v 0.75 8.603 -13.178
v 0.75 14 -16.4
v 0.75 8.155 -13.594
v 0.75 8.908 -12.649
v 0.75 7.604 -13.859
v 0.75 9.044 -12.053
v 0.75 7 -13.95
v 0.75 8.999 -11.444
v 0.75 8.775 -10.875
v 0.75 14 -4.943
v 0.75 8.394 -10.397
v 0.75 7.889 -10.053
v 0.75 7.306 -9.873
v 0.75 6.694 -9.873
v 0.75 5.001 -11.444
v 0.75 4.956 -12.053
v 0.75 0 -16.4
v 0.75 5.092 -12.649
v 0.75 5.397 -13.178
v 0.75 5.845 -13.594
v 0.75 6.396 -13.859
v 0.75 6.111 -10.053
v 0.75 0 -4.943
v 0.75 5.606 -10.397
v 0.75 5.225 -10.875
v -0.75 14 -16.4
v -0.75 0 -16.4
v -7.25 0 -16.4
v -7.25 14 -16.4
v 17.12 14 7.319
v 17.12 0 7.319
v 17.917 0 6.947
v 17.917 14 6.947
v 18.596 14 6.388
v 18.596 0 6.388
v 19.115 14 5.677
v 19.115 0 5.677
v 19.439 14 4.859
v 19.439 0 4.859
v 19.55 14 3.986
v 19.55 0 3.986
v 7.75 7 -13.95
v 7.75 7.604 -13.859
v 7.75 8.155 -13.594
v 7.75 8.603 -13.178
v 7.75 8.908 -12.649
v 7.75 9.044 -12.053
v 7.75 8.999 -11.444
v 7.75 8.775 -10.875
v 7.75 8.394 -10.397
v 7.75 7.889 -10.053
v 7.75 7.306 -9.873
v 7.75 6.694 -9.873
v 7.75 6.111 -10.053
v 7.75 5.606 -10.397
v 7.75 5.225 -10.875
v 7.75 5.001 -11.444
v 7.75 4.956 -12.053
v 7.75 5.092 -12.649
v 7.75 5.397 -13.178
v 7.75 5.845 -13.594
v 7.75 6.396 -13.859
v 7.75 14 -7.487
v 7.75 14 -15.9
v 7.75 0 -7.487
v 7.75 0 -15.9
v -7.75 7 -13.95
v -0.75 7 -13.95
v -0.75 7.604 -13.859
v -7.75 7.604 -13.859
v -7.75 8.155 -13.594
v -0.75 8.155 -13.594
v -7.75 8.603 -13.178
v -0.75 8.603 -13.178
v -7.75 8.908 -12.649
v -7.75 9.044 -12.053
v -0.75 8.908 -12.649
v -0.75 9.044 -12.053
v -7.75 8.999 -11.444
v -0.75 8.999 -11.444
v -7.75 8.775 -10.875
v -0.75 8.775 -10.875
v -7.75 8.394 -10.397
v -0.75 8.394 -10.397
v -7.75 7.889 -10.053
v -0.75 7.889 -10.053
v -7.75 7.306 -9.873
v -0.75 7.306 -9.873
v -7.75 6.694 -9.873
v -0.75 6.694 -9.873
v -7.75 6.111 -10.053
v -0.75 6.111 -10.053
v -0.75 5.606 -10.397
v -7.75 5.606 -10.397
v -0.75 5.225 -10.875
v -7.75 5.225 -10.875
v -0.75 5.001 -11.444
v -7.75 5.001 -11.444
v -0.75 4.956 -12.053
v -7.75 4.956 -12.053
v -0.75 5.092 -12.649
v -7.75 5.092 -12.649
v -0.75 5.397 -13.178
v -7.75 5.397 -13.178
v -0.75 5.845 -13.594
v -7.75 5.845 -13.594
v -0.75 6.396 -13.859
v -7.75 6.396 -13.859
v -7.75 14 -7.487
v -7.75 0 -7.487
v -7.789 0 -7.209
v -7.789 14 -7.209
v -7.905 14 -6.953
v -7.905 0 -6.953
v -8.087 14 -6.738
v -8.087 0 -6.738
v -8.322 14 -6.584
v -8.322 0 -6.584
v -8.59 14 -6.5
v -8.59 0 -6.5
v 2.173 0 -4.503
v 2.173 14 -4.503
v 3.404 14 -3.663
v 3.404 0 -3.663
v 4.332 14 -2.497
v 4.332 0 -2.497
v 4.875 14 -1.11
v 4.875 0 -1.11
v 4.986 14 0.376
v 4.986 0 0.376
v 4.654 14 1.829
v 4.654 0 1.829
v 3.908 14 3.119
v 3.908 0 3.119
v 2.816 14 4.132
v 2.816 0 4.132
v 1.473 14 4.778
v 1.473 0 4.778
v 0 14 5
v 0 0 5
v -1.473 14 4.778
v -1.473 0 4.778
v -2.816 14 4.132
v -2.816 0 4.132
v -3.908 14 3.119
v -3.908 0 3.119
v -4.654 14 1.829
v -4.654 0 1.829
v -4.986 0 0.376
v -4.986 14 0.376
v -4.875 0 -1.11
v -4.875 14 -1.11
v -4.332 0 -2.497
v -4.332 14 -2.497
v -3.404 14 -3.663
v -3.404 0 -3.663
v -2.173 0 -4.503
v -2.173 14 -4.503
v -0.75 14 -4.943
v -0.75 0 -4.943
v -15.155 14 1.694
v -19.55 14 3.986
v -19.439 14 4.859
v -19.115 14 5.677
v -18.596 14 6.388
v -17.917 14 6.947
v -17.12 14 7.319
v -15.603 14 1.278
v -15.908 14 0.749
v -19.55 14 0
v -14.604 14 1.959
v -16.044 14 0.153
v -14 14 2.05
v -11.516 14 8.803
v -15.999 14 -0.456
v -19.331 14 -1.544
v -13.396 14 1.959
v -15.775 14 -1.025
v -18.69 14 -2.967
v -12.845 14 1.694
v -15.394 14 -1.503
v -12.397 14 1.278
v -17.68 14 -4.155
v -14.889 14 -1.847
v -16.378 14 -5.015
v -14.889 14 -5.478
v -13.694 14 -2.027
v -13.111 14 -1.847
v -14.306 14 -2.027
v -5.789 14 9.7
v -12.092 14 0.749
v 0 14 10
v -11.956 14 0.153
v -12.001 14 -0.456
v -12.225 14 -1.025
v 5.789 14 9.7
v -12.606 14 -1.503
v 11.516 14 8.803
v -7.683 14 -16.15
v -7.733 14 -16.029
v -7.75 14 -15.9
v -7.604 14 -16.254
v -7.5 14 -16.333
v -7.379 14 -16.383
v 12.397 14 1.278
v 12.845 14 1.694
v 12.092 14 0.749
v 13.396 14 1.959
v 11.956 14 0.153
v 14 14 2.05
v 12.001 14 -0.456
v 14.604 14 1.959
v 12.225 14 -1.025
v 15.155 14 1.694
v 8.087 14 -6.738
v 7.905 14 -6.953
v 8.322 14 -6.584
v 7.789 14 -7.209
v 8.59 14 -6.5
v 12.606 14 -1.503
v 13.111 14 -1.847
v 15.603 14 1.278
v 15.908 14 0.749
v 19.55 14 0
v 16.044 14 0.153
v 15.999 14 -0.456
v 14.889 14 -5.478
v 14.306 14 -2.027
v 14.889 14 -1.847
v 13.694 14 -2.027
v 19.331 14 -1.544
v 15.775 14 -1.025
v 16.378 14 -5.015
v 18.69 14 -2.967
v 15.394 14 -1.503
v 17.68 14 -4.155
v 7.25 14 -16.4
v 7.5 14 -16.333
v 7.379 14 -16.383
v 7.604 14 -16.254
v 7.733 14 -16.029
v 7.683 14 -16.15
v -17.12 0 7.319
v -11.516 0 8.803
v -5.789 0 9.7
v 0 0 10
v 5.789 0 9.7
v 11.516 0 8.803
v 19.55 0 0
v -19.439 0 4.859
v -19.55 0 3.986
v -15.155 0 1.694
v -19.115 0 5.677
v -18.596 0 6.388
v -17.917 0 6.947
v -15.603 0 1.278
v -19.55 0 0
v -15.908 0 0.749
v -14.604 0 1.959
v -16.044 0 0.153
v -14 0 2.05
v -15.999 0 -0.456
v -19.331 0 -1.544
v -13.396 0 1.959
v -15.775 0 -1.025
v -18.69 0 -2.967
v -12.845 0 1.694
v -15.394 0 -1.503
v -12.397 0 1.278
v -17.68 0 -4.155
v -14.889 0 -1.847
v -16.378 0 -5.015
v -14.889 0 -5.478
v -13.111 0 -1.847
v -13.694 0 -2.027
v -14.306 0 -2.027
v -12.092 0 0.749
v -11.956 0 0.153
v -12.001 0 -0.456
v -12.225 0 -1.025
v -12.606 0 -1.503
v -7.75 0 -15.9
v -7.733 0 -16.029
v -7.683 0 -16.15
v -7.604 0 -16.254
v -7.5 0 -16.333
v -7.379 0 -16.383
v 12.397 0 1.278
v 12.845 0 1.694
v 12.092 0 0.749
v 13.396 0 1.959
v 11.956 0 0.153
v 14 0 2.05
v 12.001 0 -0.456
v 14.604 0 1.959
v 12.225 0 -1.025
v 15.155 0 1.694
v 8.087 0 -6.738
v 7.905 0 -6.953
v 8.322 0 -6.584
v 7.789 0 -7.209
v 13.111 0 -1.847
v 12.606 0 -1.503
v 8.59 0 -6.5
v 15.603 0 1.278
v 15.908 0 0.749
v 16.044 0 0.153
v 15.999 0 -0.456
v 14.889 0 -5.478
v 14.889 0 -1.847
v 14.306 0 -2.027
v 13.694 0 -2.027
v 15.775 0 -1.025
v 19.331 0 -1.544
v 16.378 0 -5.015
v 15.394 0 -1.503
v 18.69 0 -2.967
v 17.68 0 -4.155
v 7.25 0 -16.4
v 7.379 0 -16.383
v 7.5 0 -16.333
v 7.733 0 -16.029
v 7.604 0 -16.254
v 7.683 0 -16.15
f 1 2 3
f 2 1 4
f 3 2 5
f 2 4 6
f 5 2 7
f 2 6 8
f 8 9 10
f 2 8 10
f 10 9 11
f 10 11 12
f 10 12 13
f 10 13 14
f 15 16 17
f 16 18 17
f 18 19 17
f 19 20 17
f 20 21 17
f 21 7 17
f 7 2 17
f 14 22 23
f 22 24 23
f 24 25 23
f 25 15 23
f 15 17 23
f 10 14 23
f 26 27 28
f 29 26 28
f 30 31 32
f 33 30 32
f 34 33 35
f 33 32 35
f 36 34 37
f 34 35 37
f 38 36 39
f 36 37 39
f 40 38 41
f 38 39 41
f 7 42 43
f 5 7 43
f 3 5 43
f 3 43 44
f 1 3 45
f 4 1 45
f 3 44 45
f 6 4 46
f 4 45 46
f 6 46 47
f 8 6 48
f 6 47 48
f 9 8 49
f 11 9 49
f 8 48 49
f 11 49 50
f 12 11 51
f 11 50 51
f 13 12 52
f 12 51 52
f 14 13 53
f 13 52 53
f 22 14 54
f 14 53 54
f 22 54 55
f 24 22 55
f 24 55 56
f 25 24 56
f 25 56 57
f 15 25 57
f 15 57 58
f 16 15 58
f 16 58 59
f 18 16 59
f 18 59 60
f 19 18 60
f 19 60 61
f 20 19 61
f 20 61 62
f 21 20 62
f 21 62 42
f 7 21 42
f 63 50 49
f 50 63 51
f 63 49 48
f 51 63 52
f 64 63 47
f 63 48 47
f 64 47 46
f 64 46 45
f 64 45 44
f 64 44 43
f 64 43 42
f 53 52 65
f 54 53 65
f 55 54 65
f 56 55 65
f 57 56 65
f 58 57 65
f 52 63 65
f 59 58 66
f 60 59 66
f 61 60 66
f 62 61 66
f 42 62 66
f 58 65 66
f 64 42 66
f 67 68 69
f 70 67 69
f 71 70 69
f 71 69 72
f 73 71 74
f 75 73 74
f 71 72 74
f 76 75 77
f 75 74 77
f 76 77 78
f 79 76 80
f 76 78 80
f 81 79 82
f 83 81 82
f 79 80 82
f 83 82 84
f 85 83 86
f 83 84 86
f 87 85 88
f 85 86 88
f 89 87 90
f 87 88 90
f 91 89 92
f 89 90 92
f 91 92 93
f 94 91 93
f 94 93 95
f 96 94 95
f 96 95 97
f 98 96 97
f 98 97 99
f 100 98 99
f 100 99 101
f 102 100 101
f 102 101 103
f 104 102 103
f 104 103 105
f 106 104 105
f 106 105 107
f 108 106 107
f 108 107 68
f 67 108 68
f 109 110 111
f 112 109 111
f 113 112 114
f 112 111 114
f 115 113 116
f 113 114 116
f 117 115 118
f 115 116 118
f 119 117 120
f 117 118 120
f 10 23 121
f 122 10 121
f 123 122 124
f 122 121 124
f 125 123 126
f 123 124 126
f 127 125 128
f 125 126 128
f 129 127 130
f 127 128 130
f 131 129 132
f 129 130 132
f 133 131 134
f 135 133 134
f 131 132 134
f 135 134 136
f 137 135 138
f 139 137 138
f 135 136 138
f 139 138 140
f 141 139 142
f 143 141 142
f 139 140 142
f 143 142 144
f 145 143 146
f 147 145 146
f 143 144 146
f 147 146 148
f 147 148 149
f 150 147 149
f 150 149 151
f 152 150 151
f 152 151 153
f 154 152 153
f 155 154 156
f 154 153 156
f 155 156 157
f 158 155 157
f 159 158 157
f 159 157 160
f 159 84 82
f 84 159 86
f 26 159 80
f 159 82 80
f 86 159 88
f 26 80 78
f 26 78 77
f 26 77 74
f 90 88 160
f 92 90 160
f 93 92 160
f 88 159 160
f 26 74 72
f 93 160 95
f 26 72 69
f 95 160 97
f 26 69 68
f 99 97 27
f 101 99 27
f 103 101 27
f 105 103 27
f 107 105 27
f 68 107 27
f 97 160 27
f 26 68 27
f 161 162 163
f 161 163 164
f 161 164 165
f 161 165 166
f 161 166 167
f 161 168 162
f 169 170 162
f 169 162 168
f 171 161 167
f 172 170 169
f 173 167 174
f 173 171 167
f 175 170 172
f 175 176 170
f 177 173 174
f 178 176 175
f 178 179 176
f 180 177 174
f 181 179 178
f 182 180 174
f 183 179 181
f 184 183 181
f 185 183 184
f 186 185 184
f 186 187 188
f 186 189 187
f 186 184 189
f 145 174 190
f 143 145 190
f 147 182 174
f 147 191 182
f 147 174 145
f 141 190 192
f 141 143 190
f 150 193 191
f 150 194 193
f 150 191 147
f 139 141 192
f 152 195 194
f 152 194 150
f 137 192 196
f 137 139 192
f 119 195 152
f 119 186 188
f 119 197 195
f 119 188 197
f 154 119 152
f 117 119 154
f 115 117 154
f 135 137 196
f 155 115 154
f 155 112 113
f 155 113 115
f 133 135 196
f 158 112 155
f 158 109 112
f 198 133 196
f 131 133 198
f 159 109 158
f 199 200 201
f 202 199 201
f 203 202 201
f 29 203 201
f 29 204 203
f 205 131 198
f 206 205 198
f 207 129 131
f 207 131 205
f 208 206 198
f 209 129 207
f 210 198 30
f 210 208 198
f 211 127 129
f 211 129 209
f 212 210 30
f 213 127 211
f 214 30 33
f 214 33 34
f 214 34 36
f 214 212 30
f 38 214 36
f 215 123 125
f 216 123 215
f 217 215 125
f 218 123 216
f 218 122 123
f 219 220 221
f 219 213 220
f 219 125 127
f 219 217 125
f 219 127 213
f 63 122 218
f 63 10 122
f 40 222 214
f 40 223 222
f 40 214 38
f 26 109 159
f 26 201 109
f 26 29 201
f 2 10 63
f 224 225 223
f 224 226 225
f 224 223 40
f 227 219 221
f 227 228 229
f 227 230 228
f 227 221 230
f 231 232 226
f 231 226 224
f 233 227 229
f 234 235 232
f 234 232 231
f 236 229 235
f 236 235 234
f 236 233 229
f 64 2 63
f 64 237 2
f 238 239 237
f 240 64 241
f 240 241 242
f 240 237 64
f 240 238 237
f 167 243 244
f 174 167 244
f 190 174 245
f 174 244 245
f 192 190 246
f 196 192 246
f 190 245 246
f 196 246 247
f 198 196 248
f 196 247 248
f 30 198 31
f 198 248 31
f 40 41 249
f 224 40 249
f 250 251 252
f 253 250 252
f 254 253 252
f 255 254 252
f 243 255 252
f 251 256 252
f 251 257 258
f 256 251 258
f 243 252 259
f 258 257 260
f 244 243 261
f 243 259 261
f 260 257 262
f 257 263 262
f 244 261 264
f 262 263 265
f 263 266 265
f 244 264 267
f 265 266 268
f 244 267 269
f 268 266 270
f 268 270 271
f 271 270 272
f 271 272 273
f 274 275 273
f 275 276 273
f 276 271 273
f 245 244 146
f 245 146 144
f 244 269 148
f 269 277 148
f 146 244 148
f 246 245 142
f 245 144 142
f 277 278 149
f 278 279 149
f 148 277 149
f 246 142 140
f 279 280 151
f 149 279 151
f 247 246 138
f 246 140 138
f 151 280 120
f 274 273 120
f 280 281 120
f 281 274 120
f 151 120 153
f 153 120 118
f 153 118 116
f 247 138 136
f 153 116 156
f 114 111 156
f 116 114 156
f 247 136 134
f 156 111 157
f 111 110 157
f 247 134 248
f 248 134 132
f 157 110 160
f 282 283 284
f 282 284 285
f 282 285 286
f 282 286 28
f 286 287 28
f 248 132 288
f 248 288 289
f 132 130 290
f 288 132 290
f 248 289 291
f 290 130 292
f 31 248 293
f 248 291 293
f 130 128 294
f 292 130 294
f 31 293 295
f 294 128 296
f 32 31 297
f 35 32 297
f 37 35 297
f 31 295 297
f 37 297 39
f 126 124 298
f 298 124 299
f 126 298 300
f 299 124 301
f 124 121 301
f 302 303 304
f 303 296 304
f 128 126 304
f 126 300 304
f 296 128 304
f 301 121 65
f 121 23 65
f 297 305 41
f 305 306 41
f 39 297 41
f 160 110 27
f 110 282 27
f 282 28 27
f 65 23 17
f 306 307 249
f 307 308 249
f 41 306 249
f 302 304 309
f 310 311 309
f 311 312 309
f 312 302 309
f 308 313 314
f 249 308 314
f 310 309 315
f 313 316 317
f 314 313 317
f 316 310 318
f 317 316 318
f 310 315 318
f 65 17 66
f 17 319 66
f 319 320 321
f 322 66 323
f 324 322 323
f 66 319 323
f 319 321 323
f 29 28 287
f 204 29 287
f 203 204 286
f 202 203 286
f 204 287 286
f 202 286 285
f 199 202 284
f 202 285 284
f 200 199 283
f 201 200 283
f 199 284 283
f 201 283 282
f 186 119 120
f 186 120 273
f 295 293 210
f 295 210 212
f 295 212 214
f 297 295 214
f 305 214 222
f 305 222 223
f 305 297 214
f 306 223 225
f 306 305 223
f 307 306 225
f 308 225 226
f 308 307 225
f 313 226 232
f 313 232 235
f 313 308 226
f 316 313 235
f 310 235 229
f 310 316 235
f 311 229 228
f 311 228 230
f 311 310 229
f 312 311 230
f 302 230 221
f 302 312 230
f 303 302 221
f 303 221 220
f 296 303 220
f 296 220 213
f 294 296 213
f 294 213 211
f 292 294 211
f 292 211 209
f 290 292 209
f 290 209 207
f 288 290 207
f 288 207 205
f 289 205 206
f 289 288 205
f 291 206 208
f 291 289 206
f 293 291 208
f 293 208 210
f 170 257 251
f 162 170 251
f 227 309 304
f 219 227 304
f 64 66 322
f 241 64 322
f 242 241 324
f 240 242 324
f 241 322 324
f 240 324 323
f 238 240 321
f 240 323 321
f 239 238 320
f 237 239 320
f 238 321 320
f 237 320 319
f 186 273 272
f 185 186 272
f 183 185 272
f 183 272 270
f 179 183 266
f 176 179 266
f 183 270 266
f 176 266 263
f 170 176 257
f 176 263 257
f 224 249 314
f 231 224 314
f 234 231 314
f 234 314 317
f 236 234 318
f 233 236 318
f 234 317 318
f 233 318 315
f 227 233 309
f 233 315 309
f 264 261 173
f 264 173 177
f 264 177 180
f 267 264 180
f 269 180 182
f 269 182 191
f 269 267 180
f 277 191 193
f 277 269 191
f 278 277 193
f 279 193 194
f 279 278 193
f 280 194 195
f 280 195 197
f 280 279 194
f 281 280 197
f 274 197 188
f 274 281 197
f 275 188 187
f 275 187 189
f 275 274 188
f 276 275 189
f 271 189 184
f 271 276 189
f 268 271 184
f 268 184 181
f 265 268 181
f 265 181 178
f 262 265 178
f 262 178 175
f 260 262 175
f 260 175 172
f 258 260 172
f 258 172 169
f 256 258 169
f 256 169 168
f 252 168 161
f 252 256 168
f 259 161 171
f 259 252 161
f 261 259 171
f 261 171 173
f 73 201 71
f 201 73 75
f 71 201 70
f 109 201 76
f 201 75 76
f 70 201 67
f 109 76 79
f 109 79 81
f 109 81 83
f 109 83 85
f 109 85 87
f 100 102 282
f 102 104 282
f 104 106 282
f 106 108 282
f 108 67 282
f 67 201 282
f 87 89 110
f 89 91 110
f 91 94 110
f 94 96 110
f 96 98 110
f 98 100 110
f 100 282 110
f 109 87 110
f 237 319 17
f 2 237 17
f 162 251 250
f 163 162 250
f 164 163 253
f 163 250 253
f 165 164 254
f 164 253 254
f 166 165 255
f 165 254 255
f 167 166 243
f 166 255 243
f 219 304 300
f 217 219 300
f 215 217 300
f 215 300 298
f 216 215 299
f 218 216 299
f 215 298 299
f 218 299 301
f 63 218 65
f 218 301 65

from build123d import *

# Parameters (mm, degrees)
SKETCH1_R           = 2.05
BOSS_EXTRUDE1_DEPTH = 14
SKETCH2_R           = 2.05
CUT_EXTRUDE1_DEPTH  = 35.788647574


with BuildPart() as part:
    # Sketch1 → Boss-Extrude1 (new body)
    with BuildSketch(Plane(origin=(0, 0, 0), x_dir=(1, 0, 0), z_dir=(0, 1, 0))):
        with BuildLine():
            Line((-19.55, 0), (-19.55, -3.98647317))
            ThreePointArc((-19.55, -3.98647317), (-18.877985148, -6.048632233), (-17.12, -7.318904715))
            ThreePointArc((-17.12, -7.318904715), (0, -10), (17.12, -7.318904715))
            ThreePointArc((17.12, -7.318904715), (18.877985148, -6.048632233), (19.55, -3.98647317))
            Line((19.55, -3.98647317), (19.55, 0))
            ThreePointArc((19.55, 0), (18.22693576, 3.59659757), (14.888553485, 5.478409687))
            Line((14.888553485, 5.478409687), (8.589900273, 6.5))
            ThreePointArc((8.589900273, 6.5), (7.988389953, 6.839065246), (7.75, 7.487100845))
            Line((7.75, 7.487100845), (7.75, 15.9))
            ThreePointArc((7.75, 15.9), (7.603553391, 16.253553391), (7.25, 16.4))
            Line((7.25, 16.4), (0.75, 16.4))
            Line((0.75, 16.4), (0.75, 4.943429983))
            ThreePointArc((0.75, 4.943429983), (0, -5), (-0.75, 4.943429983))
            Line((-0.75, 4.943429983), (-0.75, 16.4))
            Line((-0.75, 16.4), (-7.25, 16.4))
            ThreePointArc((-7.25, 16.4), (-7.603553391, 16.253553391), (-7.75, 15.9))
            Line((-7.75, 15.9), (-7.75, 7.487100845))
            ThreePointArc((-7.75, 7.487100845), (-7.988389953, 6.839065246), (-8.589900273, 6.5))
            Line((-8.589900273, 6.5), (-14.888553485, 5.478409687))
            ThreePointArc((-14.888553485, 5.478409687), (-18.22693576, 3.59659757), (-19.55, 0))
        make_face()
        with Locations(Location((-14, 0, 0), (0, 0, 270))):
            Circle(SKETCH1_R, mode=Mode.SUBTRACT)
        with Locations(Location((14, 0, 0), (0, 0, 270))):
            Circle(SKETCH1_R, mode=Mode.SUBTRACT)
    extrude(amount=BOSS_EXTRUDE1_DEPTH)

    # Sketch2 → Cut-Extrude1 (cut, through all)
    with BuildSketch(Plane(origin=(7.75, 0, 0), x_dir=(0, 0, -1), z_dir=(1, 0, 0))):
        with Locations((11.9, 7)):
            Circle(SKETCH2_R)
    extrude(amount=-CUT_EXTRUDE1_DEPTH, mode=Mode.SUBTRACT)


solid = part.part
